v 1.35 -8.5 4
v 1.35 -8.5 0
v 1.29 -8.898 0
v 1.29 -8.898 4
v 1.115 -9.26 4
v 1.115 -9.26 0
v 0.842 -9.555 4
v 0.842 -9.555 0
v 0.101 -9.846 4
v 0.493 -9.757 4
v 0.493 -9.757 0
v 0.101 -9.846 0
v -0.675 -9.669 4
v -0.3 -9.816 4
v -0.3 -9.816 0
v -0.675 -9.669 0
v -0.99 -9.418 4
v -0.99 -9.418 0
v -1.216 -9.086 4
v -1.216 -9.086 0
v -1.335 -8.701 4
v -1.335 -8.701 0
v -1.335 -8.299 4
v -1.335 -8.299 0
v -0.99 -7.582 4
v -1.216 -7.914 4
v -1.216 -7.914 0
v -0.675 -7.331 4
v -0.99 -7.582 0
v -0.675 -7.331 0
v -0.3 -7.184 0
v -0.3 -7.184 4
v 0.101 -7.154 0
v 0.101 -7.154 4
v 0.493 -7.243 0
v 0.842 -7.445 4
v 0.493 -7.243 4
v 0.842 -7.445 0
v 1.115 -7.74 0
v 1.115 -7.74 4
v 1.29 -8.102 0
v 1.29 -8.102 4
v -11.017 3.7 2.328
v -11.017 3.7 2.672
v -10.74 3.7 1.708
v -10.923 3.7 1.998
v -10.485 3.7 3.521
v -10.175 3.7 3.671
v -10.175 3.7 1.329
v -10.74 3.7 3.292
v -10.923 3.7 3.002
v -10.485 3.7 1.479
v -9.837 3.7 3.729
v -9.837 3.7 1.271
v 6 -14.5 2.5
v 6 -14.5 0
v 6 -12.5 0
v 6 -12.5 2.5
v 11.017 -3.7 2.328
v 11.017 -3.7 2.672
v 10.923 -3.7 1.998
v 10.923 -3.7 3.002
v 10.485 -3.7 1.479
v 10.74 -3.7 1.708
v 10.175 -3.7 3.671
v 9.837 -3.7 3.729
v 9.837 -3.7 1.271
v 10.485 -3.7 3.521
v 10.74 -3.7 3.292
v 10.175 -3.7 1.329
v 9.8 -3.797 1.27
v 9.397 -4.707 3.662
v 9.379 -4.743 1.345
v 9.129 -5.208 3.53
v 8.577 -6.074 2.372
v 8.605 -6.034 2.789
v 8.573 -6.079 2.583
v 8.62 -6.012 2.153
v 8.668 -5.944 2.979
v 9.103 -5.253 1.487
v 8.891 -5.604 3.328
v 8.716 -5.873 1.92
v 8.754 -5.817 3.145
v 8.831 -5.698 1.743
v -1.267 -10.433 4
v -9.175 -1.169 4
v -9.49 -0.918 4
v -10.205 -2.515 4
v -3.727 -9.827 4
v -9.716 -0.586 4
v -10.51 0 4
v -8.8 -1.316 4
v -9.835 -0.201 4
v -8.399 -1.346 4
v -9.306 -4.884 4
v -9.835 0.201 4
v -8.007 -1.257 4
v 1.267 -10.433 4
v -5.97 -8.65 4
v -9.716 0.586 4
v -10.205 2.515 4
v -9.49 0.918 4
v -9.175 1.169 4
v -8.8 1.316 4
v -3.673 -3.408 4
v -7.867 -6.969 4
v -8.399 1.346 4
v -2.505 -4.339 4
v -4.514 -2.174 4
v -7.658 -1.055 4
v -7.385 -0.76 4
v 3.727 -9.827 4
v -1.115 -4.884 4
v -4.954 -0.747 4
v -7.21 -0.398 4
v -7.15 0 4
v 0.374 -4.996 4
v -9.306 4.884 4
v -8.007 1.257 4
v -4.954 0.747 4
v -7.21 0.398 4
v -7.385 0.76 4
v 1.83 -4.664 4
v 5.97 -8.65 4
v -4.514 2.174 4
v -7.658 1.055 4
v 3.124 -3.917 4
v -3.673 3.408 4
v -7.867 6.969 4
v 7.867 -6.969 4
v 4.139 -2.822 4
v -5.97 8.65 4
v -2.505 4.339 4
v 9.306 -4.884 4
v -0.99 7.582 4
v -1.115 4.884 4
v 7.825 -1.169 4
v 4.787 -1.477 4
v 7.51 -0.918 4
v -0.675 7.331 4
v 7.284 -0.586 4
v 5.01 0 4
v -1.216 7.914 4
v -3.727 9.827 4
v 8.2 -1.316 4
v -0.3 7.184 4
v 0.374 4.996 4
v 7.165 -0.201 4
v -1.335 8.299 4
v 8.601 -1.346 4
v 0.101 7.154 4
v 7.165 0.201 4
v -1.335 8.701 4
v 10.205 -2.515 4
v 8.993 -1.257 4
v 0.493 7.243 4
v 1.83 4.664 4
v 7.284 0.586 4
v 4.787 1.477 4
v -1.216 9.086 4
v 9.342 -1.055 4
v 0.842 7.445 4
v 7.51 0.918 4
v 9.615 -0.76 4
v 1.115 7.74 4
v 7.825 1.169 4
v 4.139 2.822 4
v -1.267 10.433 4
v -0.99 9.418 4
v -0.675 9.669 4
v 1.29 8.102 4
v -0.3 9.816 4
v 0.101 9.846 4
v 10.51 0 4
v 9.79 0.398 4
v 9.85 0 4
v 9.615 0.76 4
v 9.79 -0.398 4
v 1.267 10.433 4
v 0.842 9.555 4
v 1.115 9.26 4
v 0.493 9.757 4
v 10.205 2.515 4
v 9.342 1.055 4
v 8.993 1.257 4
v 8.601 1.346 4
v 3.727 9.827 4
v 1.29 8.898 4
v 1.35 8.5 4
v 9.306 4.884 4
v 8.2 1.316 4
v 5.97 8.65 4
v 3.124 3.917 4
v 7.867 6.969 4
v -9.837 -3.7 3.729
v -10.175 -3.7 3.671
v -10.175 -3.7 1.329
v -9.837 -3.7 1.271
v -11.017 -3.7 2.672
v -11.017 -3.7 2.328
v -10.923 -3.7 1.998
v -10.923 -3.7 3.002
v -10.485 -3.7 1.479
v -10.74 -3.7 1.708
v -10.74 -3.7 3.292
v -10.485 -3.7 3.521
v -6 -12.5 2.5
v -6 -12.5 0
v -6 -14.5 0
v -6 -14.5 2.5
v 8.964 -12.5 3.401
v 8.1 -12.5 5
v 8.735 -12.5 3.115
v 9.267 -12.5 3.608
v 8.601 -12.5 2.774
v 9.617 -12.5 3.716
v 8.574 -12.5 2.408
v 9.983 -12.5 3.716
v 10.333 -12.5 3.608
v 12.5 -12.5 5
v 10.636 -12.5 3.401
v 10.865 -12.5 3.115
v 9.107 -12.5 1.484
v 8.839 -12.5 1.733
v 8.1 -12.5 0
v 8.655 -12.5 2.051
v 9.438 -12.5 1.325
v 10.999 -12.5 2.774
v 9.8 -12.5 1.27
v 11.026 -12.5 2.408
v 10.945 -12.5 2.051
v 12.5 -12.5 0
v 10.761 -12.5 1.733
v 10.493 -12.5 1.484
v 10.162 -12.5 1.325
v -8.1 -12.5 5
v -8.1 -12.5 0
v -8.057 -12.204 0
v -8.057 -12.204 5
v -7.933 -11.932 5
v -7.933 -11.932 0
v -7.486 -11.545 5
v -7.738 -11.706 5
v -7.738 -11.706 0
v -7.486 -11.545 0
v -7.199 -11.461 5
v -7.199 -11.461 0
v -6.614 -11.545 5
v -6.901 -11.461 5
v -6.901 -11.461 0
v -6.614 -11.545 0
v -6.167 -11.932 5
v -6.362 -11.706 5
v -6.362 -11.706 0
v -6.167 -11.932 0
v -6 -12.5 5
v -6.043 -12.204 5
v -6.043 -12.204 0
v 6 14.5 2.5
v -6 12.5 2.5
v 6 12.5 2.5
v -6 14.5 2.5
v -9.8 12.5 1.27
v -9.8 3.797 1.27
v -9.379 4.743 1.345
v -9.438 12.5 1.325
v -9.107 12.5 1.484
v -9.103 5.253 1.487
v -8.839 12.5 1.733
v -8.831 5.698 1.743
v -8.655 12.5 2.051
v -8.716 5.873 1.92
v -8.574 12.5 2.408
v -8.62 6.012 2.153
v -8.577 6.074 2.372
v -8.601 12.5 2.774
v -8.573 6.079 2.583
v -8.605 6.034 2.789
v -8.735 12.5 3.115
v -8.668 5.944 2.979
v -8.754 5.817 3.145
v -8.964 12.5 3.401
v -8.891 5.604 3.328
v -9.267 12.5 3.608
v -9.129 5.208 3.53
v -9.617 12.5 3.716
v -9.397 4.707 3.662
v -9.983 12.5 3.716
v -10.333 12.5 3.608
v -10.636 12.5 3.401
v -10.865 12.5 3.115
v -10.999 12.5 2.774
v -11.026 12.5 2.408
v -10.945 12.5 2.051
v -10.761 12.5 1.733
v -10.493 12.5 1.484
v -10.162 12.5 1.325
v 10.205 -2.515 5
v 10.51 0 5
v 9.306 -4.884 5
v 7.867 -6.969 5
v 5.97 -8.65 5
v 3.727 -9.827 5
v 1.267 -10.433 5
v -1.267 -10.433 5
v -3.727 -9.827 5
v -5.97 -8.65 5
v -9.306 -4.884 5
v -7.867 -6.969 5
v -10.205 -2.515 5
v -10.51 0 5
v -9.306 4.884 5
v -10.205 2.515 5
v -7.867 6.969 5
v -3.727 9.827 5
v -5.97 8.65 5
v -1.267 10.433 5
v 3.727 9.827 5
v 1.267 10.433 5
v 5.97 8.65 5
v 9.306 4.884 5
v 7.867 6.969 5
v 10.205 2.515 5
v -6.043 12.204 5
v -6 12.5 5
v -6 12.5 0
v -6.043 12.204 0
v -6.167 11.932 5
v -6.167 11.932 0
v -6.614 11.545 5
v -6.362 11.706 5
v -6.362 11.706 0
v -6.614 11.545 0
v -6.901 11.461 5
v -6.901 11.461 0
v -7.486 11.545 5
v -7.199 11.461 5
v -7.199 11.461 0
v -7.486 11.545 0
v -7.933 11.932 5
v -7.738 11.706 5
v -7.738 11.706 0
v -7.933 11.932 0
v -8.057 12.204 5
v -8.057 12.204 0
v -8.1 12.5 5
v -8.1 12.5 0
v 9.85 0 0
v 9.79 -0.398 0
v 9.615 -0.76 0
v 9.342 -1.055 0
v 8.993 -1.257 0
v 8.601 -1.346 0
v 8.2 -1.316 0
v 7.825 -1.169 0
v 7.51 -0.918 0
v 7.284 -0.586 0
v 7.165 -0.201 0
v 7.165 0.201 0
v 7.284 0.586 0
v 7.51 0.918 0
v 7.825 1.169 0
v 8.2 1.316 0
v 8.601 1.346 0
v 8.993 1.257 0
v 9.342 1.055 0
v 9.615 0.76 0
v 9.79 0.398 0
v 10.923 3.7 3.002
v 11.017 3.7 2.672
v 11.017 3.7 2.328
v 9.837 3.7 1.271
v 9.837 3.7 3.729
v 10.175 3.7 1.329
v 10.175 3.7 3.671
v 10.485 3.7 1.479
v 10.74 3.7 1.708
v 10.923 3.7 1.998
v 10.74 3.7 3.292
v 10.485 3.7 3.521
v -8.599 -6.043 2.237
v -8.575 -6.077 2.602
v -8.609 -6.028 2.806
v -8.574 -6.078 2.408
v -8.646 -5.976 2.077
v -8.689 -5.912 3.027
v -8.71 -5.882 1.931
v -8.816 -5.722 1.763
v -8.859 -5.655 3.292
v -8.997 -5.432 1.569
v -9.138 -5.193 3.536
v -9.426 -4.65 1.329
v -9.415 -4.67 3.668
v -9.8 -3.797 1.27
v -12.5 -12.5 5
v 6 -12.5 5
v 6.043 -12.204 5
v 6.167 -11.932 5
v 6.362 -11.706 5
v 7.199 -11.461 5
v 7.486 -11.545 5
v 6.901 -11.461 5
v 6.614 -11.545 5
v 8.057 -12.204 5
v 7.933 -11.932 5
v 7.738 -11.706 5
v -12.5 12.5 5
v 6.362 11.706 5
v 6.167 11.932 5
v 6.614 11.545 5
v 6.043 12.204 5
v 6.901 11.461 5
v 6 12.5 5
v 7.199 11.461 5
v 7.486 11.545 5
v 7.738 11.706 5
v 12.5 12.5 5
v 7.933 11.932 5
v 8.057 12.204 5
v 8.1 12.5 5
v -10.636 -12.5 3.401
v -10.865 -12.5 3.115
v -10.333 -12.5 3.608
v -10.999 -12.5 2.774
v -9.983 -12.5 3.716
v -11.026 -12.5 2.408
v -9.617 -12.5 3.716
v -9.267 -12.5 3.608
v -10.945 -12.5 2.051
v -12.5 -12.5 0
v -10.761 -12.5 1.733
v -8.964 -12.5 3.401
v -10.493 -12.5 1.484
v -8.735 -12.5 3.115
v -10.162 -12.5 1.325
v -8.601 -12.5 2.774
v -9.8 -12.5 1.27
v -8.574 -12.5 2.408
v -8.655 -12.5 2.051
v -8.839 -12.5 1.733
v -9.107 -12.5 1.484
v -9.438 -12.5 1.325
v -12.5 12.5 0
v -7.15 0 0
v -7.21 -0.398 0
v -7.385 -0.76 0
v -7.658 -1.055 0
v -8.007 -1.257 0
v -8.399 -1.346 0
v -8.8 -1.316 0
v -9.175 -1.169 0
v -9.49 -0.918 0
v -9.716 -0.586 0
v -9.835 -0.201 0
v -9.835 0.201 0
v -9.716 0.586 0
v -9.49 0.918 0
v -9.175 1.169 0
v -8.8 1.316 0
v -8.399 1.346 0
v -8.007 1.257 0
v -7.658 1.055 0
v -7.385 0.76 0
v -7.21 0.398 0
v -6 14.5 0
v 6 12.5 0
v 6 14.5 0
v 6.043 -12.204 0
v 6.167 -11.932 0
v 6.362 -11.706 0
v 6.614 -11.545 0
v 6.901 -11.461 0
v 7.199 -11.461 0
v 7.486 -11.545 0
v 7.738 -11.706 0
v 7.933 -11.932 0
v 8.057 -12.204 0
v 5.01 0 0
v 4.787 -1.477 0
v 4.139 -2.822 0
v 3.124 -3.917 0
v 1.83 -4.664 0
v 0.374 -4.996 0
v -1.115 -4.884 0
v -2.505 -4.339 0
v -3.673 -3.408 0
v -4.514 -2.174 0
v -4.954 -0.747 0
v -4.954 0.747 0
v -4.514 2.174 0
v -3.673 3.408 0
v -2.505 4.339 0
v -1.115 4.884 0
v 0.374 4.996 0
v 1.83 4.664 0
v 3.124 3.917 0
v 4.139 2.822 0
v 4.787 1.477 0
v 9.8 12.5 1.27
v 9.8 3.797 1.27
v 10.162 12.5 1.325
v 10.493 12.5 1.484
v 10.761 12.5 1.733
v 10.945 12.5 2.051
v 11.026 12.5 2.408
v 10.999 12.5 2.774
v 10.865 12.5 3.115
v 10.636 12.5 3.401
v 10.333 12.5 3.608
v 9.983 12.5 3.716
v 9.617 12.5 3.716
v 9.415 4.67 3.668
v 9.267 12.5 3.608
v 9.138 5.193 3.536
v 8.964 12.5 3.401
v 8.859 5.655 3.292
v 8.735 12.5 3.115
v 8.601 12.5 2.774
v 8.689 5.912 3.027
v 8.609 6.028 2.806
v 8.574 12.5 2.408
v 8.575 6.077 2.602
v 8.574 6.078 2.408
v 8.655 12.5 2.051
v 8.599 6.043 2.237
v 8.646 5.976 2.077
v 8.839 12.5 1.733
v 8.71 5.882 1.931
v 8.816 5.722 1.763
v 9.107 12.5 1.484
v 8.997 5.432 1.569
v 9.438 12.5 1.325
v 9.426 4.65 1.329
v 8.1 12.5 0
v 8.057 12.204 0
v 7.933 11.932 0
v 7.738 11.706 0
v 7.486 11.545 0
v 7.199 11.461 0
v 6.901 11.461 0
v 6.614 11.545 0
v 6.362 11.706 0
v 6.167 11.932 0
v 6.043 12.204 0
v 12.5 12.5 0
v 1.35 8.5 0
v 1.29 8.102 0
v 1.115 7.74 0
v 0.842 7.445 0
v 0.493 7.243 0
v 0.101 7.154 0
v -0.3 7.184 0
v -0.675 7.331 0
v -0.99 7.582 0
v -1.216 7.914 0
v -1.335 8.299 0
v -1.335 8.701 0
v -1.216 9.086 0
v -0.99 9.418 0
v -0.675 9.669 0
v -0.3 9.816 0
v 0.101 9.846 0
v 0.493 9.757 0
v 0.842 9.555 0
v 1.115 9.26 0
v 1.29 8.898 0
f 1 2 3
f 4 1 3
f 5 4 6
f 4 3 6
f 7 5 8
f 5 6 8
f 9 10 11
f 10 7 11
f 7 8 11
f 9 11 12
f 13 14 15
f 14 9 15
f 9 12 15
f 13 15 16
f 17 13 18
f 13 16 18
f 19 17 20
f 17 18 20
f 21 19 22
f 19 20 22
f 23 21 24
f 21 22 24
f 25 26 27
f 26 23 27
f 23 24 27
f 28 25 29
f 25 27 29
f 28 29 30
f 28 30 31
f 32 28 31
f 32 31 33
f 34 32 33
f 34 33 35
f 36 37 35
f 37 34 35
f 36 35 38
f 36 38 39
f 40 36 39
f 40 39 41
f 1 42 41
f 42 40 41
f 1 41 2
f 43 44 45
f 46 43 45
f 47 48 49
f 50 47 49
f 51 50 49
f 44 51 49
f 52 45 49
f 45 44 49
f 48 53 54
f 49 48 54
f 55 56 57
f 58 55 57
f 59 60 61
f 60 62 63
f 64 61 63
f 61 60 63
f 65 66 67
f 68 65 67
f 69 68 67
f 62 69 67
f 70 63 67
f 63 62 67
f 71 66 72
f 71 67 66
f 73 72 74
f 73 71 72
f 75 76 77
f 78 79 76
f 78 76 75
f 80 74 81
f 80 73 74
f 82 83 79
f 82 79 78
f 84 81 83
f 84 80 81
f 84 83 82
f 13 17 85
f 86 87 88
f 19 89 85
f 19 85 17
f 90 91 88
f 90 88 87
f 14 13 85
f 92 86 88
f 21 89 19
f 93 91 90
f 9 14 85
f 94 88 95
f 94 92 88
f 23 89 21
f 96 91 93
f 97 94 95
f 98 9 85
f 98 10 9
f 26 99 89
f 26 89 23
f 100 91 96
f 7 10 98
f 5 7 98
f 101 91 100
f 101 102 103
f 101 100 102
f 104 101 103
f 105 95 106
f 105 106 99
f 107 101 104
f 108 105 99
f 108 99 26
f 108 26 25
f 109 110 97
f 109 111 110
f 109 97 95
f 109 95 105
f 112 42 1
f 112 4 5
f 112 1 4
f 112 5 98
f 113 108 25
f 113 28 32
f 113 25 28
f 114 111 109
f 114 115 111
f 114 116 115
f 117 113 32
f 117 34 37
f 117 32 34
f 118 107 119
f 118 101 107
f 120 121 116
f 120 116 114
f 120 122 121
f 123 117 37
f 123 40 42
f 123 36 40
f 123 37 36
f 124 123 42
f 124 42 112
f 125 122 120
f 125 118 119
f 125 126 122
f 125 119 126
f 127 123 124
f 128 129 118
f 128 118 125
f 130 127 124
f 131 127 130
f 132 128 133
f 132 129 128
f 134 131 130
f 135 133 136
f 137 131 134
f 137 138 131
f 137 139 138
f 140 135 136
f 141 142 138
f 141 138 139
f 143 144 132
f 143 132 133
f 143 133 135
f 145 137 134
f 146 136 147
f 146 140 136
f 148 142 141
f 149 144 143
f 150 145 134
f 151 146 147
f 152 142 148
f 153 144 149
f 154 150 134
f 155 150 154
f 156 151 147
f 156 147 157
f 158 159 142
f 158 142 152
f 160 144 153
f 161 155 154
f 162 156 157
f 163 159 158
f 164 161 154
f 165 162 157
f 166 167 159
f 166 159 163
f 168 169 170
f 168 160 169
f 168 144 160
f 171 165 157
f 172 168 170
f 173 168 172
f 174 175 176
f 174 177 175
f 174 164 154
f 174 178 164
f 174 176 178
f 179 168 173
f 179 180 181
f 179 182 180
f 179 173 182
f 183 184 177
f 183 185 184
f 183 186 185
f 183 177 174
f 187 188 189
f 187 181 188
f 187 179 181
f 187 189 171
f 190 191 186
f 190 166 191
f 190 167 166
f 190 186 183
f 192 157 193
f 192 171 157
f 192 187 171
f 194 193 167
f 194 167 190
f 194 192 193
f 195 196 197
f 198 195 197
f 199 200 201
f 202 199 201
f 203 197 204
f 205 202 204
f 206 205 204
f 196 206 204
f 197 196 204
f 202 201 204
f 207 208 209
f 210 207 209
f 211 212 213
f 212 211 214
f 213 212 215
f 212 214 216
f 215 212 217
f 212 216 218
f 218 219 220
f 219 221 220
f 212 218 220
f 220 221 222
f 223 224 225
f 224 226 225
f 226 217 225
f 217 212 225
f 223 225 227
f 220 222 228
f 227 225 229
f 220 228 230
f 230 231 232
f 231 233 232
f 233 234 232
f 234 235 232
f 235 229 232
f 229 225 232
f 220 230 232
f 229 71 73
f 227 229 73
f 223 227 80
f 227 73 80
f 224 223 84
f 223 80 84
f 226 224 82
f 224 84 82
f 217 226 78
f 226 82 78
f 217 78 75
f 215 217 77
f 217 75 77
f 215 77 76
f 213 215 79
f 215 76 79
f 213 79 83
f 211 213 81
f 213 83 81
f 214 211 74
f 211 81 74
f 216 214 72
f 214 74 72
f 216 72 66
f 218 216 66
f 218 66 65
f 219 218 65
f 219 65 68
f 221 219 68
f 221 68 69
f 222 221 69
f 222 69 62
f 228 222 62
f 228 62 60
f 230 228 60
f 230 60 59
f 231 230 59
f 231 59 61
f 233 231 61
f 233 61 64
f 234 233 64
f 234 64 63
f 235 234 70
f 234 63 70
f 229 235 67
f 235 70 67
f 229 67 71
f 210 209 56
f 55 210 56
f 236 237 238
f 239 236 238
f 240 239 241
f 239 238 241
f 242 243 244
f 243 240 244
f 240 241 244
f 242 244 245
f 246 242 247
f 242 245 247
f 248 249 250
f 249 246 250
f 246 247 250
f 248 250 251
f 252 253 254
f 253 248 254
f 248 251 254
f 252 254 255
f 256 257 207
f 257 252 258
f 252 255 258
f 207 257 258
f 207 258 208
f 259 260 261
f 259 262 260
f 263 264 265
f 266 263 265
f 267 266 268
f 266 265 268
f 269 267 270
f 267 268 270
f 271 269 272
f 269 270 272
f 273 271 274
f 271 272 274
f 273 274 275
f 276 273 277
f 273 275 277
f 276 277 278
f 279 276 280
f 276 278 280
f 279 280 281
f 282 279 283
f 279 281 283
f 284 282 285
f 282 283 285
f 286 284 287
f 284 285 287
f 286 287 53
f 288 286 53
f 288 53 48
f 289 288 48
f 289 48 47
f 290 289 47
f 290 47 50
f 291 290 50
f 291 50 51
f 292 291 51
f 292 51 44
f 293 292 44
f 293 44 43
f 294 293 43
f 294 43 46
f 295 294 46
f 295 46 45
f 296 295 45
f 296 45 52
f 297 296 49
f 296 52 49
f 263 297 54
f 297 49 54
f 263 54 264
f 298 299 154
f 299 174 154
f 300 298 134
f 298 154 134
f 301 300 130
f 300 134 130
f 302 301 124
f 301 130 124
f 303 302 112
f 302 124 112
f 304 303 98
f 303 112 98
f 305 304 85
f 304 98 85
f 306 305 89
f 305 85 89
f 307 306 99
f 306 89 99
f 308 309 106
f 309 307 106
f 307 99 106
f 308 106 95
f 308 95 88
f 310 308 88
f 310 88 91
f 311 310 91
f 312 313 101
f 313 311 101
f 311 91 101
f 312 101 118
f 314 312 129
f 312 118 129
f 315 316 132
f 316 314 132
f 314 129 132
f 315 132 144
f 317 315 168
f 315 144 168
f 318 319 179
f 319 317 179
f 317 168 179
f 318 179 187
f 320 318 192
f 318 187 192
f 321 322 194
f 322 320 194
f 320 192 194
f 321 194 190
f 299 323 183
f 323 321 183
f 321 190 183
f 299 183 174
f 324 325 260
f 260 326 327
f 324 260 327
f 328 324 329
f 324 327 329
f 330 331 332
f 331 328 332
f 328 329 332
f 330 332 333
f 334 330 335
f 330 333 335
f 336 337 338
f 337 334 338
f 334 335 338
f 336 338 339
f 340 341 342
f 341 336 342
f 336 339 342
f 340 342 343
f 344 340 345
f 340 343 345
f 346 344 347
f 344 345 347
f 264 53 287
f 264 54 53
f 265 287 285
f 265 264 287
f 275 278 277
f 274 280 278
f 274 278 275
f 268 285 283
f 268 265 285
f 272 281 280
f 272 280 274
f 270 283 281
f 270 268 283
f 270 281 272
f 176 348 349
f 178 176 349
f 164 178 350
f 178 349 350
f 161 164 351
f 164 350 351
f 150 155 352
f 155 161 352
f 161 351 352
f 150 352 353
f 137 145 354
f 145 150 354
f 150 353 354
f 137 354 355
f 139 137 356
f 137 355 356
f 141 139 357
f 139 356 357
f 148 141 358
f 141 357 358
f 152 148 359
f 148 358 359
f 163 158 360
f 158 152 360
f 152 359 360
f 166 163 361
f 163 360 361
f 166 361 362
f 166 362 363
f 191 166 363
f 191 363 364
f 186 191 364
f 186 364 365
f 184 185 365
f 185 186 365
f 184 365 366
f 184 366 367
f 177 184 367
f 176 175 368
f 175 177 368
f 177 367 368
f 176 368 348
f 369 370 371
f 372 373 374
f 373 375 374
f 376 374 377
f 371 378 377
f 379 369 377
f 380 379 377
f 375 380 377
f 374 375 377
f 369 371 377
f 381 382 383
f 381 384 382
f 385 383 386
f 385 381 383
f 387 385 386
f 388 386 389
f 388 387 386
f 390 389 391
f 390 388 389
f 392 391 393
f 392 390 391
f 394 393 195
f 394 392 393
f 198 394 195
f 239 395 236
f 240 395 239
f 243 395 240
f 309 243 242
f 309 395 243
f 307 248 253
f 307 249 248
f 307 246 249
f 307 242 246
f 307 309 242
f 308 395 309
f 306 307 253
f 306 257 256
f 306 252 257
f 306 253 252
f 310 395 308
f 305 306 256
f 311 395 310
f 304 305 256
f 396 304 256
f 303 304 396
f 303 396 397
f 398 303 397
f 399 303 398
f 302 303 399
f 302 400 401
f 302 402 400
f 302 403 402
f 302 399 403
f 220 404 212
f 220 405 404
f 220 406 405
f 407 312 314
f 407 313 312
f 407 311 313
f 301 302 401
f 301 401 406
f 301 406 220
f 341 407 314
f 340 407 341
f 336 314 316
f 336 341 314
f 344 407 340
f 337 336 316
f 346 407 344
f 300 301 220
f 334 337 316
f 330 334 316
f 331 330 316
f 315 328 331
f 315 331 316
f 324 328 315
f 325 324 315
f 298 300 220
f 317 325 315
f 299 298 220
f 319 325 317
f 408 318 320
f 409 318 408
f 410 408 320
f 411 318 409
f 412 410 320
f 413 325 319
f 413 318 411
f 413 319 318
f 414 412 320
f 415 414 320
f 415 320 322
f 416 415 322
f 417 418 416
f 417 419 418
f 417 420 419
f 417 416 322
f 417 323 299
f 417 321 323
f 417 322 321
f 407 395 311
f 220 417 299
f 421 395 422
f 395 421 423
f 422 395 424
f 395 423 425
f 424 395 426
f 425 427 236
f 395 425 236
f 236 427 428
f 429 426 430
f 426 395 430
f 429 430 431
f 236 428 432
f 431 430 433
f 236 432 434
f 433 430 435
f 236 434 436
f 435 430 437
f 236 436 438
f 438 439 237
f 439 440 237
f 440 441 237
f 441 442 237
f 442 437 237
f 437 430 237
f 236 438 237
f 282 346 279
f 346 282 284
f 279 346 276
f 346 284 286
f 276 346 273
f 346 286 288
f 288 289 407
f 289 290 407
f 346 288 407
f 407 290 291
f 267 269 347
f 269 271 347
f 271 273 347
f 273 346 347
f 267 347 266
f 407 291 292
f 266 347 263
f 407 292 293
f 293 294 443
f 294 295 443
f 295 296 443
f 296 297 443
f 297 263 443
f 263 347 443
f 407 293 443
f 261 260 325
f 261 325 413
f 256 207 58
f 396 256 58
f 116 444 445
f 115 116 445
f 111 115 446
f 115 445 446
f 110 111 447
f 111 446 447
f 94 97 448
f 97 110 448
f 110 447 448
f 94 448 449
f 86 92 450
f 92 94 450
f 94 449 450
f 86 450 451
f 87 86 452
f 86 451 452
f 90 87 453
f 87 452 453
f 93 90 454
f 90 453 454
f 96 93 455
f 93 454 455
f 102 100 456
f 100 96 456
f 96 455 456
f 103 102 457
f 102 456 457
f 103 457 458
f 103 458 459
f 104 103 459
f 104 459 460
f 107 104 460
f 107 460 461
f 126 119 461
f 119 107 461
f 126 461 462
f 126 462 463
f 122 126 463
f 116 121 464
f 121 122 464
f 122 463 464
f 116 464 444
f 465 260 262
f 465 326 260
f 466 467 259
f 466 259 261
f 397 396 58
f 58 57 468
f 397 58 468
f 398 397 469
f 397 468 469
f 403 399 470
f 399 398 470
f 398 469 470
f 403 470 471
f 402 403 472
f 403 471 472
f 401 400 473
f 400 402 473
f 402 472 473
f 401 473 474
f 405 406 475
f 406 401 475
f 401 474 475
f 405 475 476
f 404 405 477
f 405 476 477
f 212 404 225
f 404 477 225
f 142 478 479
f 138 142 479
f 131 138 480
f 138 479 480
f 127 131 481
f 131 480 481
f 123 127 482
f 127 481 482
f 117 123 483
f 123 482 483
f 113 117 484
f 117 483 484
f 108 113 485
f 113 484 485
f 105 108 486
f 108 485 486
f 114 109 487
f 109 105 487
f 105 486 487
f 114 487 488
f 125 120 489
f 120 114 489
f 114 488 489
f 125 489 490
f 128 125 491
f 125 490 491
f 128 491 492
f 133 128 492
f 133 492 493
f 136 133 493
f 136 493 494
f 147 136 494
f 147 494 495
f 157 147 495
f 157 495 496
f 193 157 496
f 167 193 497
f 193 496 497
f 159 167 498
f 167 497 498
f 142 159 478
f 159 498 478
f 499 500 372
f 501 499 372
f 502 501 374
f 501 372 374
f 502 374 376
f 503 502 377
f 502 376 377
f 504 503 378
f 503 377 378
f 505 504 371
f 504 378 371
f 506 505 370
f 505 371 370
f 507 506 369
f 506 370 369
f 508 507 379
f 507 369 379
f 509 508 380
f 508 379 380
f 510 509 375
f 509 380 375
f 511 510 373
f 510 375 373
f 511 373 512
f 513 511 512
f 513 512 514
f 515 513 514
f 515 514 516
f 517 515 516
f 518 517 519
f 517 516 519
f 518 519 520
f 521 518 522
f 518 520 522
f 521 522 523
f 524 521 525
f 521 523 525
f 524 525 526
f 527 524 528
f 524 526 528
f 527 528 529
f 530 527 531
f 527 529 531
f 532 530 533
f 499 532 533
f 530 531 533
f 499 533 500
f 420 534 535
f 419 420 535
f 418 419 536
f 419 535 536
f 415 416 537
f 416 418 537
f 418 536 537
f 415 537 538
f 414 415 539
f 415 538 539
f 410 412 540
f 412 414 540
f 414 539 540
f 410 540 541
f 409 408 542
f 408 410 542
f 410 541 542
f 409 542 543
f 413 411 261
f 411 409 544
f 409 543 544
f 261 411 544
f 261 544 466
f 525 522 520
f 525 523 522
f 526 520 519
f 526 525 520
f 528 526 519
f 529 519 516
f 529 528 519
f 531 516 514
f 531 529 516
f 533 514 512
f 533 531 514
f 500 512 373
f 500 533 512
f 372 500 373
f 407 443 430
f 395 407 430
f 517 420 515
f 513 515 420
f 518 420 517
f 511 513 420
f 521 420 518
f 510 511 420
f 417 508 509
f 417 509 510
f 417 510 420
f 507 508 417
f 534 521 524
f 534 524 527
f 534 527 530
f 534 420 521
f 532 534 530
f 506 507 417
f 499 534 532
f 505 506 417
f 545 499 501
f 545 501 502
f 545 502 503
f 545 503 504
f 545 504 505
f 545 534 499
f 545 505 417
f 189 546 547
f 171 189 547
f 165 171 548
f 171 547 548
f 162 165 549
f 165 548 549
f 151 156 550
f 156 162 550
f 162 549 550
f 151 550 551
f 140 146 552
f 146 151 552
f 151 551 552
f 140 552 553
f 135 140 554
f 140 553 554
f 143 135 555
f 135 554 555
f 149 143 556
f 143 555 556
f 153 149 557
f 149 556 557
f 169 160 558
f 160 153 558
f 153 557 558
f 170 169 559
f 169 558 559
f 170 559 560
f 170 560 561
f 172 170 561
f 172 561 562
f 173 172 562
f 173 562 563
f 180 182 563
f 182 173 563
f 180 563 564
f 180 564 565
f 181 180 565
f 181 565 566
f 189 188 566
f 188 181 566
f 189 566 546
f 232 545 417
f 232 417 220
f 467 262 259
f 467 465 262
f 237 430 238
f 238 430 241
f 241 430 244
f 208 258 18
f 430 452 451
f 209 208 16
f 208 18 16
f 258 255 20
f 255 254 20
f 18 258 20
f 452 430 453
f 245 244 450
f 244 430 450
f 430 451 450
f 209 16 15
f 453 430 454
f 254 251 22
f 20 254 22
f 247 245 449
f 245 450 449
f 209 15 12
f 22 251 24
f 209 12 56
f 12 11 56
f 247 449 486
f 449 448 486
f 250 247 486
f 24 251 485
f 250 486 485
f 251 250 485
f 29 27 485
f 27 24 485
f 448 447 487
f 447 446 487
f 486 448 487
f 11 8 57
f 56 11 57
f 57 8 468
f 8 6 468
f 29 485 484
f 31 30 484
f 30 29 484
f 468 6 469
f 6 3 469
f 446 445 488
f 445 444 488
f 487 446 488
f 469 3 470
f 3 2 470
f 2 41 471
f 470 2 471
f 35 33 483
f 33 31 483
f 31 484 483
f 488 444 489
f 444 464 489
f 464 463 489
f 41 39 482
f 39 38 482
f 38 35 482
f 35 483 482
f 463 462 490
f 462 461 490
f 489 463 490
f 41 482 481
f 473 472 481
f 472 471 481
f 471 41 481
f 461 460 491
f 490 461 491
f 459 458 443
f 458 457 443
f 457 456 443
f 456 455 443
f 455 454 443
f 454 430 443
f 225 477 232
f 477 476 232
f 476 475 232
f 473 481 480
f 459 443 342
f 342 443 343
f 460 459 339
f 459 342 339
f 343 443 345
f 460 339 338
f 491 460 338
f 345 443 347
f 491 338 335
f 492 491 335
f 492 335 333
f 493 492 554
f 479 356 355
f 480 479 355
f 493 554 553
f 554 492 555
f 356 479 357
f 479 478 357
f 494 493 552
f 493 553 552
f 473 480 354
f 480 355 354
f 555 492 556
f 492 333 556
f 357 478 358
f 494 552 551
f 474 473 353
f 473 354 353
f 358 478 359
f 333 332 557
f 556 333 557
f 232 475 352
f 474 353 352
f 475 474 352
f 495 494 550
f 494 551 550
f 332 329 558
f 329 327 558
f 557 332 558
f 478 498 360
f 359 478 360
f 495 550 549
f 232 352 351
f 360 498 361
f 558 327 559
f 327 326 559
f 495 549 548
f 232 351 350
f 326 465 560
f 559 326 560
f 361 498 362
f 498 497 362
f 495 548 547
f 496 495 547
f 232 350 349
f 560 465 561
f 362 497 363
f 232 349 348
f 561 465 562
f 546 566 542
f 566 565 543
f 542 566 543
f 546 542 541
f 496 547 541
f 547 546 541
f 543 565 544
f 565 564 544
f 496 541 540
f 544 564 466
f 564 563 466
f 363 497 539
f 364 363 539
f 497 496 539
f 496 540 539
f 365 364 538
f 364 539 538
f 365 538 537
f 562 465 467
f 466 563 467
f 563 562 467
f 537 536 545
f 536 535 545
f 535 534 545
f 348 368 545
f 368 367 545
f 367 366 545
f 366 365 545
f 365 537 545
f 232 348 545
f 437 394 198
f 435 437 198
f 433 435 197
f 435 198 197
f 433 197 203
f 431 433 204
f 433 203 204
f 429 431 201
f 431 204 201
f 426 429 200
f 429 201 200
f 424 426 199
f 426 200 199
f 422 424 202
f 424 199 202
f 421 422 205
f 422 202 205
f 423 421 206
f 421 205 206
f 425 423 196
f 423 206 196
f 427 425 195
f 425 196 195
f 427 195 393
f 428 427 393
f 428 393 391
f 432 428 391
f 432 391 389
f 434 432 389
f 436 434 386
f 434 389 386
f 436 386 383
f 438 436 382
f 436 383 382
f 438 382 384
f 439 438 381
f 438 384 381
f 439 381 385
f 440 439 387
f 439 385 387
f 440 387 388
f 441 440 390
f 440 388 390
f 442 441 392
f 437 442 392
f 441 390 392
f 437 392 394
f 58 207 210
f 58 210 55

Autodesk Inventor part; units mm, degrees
ref_plane "YZ Plane" through (0, 0, 0) normal (1, 0, 0) x (0, 1, 0)
ref_plane "XZ Plane" through (0, 0, 0) normal (0, 1, 0) x (-1, 0, 0)
ref_plane "XY Plane" through (0, 0, 0) normal (0, 0, 1) x (1, 0, 0)
sketch "スケッチ1" plane through (0, 0, 0) normal (0, 0, 1) x (1, 0, 0)
  line L0 (12.5, -12.5) -> (12.5, 12.5) construction
  line L1 (-12.5, 12.5) -> (-12.5, -12.5) construction
  line L2 (-12.5, -12.5) -> (12.5, 12.5) construction
  line L3 (12.5, -12.5) -> (-12.5, 12.5) construction
  line L4 (-8.1, 12.5) -> (-12.5, 12.5)
  line L5 (-12.5, 12.5) -> (-12.5, 8.9019)
  line L6 (8.1, 12.5) -> (12.5, 12.5)
  line L7 (12.5, 12.5) -> (12.5, 8.1)
  line L8 (-12.5, -7.2981) -> (-12.5, -12.5)
  line L9 (-12.5, -12.5) -> (-8.1, -12.5)
  line L10 (8.1, -12.5) -> (12.5, -12.5)
  line L11 (12.5, -12.5) -> (12.5, -8.1)
  line L12 (-6, 12.5) -> (-6, 14.5)
  line L13 (-6, 14.5) -> (6, 14.5)
  line L14 (6, 14.5) -> (6, 12.5)
  arc A0 (-8.1, 12.5) -> (-6, 12.5) centre (-7.05, 12.5) ccw
  arc A1 (6, 12.5) -> (8.1, 12.5) centre (7.05, 12.5) ccw
  line L15 (0, 12.5) -> (0, 0) construction
  line L16 (0, 0) -> (12.5, 0) construction
  line L17 (-6, -12.5) -> (-6, -14.5)
  line L18 (-6, -14.5) -> (6, -14.5)
  line L19 (6, -14.5) -> (6, -12.5)
  arc A2 (-6, -12.5) -> (-8.1, -12.5) centre (-7.05, -12.5) ccw
  arc A3 (8.1, -12.5) -> (6, -12.5) centre (7.05, -12.5) ccw
  line L20 (-11.35, 12.5) -> (-8.25, 12.5) construction
  line L21 (-8.25, 12.5) -> (-8.25, 8.5) construction
  line L22 (-8.25, 8.5) -> (-11.35, 8.5) construction
  line L23 (-11.35, 8.5) -> (-11.35, 12.5) construction
  line L24 (-12.5, 6.7519) -> (-12.5, 9.8519) construction
  line L25 (-9.8, 12.5) -> (-9.8, 8.5) construction
  line L26 (-12.5, -12.5) -> (-12.5, 12.5)
  line L27 (12.5, -12.5) -> (12.5, 12.5)
  line L28 (0, -14.5) -> (0, 14.5) construction
  circle A4 centre (0, -8.5) radius 1.35
  circle A5 centre (8.5, 0) radius 1.35
  circle A6 centre (0, 8.5) radius 1.35
  circle A7 centre (-8.5, 0) radius 1.35
  circle A8 centre (0, 0) radius 5.01
  circle A9 centre (0, 0) radius 10.51
  line L29 (-6, 12.5) -> (6, 12.5)
  line L30 (-6, -12.5) -> (6, -12.5)
  dimension "d0" = 25
  dimension "d1" = 1.05
  dimension "d3" = 6.5
  dimension "d4" = 3.1
  dimension "d6" = 4
  dimension "d18" = 2.7
  dimension "d46" = 25
  dimension "d58" = 2.7
  dimension "d59" = 8.5
  dimension "d62" = 360
  dimension "d64" = 10.02
  dimension "d65" = 21.02
  dimension "d68" = 2
extrude "押し出し1" add sketch "スケッチ1" along normal blind 5 contours A0 L29 A1 L6 L7 L27 L11 L10 A3 L30 A2 L9 L8 L26 L5 L4
sketch "スケッチ2" plane through (-12.5, -12.5, 5) normal (0, -1, 0) x (1, 0, 0)
  line L0 (12.5, 0) -> (12.5, -5.2657) construction
  line L1 (0, -2.5) -> (22.3, -2.5) construction
  line L2 (25, -5) -> (25, 0) projected
  line L3 (0, -5) -> (0, 0) projected
  line L4 (0, 0) -> (4.4, 0) projected
  point P0 (12.5, -5)
  point P1 (2.7, -2.5)
  dimension "d56" = 2.7
  dimension "d57" = 2.7
  dimension "d69" = 2.5
hole "穴1" at (-9.8, -12.5, 2.5) at (9.8, -12.5, 2.5) direction (0, 1, 0) diameter 2.459 depth 8.8 thread size "M3x0.5" class "6H" standard "ISO Metric profile"
pattern_circular "円形状パターン1" count 2 over 360 about axis through (0, 0, -10) along (0, 0, 1) of "穴1"
extrude "押し出し2" add sketch "スケッチ1" along normal blind 4 contours A9
extrude "押し出し3" add sketch "スケッチ1" along normal blind 2.5 contours L12 L13 L14 L29 | L30 L19 L18 L17
equation "\"d57\" = d56"
properties part number "Head_horn_frame" material "アセタール樹脂、黒"
